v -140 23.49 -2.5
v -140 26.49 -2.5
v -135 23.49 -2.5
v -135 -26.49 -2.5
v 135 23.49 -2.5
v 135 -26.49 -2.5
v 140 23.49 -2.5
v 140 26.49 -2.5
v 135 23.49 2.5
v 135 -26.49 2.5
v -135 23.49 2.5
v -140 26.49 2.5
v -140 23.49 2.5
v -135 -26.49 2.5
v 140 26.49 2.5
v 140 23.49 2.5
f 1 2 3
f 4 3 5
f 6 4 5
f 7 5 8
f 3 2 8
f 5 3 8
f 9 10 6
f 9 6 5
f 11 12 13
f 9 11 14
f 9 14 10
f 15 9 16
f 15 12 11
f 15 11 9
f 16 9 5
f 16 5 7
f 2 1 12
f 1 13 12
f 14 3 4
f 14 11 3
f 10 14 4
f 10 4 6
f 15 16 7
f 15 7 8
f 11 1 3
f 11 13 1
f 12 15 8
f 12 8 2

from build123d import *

# Parameters (mm, degrees)
F0_W     = 5
F0_H     = 3
F1_DEPTH = 2.5


with BuildPart() as f1:
    # F0 (on Top) → F1 (new body, symmetric)
    with BuildSketch(Plane.XY):
        Polygon((135, 26.49), (-135, 26.49), (-135, 23.49), (-135, -26.49), (135, -26.49), (135, 23.49), align=None)
        with Locations((137.5, 24.99)):
            Rectangle(F0_W, F0_H)
        with Locations((-137.5, 24.99)):
            Rectangle(F0_W, F0_H)
    extrude(amount=F1_DEPTH, both=True)


solid = f1.part
